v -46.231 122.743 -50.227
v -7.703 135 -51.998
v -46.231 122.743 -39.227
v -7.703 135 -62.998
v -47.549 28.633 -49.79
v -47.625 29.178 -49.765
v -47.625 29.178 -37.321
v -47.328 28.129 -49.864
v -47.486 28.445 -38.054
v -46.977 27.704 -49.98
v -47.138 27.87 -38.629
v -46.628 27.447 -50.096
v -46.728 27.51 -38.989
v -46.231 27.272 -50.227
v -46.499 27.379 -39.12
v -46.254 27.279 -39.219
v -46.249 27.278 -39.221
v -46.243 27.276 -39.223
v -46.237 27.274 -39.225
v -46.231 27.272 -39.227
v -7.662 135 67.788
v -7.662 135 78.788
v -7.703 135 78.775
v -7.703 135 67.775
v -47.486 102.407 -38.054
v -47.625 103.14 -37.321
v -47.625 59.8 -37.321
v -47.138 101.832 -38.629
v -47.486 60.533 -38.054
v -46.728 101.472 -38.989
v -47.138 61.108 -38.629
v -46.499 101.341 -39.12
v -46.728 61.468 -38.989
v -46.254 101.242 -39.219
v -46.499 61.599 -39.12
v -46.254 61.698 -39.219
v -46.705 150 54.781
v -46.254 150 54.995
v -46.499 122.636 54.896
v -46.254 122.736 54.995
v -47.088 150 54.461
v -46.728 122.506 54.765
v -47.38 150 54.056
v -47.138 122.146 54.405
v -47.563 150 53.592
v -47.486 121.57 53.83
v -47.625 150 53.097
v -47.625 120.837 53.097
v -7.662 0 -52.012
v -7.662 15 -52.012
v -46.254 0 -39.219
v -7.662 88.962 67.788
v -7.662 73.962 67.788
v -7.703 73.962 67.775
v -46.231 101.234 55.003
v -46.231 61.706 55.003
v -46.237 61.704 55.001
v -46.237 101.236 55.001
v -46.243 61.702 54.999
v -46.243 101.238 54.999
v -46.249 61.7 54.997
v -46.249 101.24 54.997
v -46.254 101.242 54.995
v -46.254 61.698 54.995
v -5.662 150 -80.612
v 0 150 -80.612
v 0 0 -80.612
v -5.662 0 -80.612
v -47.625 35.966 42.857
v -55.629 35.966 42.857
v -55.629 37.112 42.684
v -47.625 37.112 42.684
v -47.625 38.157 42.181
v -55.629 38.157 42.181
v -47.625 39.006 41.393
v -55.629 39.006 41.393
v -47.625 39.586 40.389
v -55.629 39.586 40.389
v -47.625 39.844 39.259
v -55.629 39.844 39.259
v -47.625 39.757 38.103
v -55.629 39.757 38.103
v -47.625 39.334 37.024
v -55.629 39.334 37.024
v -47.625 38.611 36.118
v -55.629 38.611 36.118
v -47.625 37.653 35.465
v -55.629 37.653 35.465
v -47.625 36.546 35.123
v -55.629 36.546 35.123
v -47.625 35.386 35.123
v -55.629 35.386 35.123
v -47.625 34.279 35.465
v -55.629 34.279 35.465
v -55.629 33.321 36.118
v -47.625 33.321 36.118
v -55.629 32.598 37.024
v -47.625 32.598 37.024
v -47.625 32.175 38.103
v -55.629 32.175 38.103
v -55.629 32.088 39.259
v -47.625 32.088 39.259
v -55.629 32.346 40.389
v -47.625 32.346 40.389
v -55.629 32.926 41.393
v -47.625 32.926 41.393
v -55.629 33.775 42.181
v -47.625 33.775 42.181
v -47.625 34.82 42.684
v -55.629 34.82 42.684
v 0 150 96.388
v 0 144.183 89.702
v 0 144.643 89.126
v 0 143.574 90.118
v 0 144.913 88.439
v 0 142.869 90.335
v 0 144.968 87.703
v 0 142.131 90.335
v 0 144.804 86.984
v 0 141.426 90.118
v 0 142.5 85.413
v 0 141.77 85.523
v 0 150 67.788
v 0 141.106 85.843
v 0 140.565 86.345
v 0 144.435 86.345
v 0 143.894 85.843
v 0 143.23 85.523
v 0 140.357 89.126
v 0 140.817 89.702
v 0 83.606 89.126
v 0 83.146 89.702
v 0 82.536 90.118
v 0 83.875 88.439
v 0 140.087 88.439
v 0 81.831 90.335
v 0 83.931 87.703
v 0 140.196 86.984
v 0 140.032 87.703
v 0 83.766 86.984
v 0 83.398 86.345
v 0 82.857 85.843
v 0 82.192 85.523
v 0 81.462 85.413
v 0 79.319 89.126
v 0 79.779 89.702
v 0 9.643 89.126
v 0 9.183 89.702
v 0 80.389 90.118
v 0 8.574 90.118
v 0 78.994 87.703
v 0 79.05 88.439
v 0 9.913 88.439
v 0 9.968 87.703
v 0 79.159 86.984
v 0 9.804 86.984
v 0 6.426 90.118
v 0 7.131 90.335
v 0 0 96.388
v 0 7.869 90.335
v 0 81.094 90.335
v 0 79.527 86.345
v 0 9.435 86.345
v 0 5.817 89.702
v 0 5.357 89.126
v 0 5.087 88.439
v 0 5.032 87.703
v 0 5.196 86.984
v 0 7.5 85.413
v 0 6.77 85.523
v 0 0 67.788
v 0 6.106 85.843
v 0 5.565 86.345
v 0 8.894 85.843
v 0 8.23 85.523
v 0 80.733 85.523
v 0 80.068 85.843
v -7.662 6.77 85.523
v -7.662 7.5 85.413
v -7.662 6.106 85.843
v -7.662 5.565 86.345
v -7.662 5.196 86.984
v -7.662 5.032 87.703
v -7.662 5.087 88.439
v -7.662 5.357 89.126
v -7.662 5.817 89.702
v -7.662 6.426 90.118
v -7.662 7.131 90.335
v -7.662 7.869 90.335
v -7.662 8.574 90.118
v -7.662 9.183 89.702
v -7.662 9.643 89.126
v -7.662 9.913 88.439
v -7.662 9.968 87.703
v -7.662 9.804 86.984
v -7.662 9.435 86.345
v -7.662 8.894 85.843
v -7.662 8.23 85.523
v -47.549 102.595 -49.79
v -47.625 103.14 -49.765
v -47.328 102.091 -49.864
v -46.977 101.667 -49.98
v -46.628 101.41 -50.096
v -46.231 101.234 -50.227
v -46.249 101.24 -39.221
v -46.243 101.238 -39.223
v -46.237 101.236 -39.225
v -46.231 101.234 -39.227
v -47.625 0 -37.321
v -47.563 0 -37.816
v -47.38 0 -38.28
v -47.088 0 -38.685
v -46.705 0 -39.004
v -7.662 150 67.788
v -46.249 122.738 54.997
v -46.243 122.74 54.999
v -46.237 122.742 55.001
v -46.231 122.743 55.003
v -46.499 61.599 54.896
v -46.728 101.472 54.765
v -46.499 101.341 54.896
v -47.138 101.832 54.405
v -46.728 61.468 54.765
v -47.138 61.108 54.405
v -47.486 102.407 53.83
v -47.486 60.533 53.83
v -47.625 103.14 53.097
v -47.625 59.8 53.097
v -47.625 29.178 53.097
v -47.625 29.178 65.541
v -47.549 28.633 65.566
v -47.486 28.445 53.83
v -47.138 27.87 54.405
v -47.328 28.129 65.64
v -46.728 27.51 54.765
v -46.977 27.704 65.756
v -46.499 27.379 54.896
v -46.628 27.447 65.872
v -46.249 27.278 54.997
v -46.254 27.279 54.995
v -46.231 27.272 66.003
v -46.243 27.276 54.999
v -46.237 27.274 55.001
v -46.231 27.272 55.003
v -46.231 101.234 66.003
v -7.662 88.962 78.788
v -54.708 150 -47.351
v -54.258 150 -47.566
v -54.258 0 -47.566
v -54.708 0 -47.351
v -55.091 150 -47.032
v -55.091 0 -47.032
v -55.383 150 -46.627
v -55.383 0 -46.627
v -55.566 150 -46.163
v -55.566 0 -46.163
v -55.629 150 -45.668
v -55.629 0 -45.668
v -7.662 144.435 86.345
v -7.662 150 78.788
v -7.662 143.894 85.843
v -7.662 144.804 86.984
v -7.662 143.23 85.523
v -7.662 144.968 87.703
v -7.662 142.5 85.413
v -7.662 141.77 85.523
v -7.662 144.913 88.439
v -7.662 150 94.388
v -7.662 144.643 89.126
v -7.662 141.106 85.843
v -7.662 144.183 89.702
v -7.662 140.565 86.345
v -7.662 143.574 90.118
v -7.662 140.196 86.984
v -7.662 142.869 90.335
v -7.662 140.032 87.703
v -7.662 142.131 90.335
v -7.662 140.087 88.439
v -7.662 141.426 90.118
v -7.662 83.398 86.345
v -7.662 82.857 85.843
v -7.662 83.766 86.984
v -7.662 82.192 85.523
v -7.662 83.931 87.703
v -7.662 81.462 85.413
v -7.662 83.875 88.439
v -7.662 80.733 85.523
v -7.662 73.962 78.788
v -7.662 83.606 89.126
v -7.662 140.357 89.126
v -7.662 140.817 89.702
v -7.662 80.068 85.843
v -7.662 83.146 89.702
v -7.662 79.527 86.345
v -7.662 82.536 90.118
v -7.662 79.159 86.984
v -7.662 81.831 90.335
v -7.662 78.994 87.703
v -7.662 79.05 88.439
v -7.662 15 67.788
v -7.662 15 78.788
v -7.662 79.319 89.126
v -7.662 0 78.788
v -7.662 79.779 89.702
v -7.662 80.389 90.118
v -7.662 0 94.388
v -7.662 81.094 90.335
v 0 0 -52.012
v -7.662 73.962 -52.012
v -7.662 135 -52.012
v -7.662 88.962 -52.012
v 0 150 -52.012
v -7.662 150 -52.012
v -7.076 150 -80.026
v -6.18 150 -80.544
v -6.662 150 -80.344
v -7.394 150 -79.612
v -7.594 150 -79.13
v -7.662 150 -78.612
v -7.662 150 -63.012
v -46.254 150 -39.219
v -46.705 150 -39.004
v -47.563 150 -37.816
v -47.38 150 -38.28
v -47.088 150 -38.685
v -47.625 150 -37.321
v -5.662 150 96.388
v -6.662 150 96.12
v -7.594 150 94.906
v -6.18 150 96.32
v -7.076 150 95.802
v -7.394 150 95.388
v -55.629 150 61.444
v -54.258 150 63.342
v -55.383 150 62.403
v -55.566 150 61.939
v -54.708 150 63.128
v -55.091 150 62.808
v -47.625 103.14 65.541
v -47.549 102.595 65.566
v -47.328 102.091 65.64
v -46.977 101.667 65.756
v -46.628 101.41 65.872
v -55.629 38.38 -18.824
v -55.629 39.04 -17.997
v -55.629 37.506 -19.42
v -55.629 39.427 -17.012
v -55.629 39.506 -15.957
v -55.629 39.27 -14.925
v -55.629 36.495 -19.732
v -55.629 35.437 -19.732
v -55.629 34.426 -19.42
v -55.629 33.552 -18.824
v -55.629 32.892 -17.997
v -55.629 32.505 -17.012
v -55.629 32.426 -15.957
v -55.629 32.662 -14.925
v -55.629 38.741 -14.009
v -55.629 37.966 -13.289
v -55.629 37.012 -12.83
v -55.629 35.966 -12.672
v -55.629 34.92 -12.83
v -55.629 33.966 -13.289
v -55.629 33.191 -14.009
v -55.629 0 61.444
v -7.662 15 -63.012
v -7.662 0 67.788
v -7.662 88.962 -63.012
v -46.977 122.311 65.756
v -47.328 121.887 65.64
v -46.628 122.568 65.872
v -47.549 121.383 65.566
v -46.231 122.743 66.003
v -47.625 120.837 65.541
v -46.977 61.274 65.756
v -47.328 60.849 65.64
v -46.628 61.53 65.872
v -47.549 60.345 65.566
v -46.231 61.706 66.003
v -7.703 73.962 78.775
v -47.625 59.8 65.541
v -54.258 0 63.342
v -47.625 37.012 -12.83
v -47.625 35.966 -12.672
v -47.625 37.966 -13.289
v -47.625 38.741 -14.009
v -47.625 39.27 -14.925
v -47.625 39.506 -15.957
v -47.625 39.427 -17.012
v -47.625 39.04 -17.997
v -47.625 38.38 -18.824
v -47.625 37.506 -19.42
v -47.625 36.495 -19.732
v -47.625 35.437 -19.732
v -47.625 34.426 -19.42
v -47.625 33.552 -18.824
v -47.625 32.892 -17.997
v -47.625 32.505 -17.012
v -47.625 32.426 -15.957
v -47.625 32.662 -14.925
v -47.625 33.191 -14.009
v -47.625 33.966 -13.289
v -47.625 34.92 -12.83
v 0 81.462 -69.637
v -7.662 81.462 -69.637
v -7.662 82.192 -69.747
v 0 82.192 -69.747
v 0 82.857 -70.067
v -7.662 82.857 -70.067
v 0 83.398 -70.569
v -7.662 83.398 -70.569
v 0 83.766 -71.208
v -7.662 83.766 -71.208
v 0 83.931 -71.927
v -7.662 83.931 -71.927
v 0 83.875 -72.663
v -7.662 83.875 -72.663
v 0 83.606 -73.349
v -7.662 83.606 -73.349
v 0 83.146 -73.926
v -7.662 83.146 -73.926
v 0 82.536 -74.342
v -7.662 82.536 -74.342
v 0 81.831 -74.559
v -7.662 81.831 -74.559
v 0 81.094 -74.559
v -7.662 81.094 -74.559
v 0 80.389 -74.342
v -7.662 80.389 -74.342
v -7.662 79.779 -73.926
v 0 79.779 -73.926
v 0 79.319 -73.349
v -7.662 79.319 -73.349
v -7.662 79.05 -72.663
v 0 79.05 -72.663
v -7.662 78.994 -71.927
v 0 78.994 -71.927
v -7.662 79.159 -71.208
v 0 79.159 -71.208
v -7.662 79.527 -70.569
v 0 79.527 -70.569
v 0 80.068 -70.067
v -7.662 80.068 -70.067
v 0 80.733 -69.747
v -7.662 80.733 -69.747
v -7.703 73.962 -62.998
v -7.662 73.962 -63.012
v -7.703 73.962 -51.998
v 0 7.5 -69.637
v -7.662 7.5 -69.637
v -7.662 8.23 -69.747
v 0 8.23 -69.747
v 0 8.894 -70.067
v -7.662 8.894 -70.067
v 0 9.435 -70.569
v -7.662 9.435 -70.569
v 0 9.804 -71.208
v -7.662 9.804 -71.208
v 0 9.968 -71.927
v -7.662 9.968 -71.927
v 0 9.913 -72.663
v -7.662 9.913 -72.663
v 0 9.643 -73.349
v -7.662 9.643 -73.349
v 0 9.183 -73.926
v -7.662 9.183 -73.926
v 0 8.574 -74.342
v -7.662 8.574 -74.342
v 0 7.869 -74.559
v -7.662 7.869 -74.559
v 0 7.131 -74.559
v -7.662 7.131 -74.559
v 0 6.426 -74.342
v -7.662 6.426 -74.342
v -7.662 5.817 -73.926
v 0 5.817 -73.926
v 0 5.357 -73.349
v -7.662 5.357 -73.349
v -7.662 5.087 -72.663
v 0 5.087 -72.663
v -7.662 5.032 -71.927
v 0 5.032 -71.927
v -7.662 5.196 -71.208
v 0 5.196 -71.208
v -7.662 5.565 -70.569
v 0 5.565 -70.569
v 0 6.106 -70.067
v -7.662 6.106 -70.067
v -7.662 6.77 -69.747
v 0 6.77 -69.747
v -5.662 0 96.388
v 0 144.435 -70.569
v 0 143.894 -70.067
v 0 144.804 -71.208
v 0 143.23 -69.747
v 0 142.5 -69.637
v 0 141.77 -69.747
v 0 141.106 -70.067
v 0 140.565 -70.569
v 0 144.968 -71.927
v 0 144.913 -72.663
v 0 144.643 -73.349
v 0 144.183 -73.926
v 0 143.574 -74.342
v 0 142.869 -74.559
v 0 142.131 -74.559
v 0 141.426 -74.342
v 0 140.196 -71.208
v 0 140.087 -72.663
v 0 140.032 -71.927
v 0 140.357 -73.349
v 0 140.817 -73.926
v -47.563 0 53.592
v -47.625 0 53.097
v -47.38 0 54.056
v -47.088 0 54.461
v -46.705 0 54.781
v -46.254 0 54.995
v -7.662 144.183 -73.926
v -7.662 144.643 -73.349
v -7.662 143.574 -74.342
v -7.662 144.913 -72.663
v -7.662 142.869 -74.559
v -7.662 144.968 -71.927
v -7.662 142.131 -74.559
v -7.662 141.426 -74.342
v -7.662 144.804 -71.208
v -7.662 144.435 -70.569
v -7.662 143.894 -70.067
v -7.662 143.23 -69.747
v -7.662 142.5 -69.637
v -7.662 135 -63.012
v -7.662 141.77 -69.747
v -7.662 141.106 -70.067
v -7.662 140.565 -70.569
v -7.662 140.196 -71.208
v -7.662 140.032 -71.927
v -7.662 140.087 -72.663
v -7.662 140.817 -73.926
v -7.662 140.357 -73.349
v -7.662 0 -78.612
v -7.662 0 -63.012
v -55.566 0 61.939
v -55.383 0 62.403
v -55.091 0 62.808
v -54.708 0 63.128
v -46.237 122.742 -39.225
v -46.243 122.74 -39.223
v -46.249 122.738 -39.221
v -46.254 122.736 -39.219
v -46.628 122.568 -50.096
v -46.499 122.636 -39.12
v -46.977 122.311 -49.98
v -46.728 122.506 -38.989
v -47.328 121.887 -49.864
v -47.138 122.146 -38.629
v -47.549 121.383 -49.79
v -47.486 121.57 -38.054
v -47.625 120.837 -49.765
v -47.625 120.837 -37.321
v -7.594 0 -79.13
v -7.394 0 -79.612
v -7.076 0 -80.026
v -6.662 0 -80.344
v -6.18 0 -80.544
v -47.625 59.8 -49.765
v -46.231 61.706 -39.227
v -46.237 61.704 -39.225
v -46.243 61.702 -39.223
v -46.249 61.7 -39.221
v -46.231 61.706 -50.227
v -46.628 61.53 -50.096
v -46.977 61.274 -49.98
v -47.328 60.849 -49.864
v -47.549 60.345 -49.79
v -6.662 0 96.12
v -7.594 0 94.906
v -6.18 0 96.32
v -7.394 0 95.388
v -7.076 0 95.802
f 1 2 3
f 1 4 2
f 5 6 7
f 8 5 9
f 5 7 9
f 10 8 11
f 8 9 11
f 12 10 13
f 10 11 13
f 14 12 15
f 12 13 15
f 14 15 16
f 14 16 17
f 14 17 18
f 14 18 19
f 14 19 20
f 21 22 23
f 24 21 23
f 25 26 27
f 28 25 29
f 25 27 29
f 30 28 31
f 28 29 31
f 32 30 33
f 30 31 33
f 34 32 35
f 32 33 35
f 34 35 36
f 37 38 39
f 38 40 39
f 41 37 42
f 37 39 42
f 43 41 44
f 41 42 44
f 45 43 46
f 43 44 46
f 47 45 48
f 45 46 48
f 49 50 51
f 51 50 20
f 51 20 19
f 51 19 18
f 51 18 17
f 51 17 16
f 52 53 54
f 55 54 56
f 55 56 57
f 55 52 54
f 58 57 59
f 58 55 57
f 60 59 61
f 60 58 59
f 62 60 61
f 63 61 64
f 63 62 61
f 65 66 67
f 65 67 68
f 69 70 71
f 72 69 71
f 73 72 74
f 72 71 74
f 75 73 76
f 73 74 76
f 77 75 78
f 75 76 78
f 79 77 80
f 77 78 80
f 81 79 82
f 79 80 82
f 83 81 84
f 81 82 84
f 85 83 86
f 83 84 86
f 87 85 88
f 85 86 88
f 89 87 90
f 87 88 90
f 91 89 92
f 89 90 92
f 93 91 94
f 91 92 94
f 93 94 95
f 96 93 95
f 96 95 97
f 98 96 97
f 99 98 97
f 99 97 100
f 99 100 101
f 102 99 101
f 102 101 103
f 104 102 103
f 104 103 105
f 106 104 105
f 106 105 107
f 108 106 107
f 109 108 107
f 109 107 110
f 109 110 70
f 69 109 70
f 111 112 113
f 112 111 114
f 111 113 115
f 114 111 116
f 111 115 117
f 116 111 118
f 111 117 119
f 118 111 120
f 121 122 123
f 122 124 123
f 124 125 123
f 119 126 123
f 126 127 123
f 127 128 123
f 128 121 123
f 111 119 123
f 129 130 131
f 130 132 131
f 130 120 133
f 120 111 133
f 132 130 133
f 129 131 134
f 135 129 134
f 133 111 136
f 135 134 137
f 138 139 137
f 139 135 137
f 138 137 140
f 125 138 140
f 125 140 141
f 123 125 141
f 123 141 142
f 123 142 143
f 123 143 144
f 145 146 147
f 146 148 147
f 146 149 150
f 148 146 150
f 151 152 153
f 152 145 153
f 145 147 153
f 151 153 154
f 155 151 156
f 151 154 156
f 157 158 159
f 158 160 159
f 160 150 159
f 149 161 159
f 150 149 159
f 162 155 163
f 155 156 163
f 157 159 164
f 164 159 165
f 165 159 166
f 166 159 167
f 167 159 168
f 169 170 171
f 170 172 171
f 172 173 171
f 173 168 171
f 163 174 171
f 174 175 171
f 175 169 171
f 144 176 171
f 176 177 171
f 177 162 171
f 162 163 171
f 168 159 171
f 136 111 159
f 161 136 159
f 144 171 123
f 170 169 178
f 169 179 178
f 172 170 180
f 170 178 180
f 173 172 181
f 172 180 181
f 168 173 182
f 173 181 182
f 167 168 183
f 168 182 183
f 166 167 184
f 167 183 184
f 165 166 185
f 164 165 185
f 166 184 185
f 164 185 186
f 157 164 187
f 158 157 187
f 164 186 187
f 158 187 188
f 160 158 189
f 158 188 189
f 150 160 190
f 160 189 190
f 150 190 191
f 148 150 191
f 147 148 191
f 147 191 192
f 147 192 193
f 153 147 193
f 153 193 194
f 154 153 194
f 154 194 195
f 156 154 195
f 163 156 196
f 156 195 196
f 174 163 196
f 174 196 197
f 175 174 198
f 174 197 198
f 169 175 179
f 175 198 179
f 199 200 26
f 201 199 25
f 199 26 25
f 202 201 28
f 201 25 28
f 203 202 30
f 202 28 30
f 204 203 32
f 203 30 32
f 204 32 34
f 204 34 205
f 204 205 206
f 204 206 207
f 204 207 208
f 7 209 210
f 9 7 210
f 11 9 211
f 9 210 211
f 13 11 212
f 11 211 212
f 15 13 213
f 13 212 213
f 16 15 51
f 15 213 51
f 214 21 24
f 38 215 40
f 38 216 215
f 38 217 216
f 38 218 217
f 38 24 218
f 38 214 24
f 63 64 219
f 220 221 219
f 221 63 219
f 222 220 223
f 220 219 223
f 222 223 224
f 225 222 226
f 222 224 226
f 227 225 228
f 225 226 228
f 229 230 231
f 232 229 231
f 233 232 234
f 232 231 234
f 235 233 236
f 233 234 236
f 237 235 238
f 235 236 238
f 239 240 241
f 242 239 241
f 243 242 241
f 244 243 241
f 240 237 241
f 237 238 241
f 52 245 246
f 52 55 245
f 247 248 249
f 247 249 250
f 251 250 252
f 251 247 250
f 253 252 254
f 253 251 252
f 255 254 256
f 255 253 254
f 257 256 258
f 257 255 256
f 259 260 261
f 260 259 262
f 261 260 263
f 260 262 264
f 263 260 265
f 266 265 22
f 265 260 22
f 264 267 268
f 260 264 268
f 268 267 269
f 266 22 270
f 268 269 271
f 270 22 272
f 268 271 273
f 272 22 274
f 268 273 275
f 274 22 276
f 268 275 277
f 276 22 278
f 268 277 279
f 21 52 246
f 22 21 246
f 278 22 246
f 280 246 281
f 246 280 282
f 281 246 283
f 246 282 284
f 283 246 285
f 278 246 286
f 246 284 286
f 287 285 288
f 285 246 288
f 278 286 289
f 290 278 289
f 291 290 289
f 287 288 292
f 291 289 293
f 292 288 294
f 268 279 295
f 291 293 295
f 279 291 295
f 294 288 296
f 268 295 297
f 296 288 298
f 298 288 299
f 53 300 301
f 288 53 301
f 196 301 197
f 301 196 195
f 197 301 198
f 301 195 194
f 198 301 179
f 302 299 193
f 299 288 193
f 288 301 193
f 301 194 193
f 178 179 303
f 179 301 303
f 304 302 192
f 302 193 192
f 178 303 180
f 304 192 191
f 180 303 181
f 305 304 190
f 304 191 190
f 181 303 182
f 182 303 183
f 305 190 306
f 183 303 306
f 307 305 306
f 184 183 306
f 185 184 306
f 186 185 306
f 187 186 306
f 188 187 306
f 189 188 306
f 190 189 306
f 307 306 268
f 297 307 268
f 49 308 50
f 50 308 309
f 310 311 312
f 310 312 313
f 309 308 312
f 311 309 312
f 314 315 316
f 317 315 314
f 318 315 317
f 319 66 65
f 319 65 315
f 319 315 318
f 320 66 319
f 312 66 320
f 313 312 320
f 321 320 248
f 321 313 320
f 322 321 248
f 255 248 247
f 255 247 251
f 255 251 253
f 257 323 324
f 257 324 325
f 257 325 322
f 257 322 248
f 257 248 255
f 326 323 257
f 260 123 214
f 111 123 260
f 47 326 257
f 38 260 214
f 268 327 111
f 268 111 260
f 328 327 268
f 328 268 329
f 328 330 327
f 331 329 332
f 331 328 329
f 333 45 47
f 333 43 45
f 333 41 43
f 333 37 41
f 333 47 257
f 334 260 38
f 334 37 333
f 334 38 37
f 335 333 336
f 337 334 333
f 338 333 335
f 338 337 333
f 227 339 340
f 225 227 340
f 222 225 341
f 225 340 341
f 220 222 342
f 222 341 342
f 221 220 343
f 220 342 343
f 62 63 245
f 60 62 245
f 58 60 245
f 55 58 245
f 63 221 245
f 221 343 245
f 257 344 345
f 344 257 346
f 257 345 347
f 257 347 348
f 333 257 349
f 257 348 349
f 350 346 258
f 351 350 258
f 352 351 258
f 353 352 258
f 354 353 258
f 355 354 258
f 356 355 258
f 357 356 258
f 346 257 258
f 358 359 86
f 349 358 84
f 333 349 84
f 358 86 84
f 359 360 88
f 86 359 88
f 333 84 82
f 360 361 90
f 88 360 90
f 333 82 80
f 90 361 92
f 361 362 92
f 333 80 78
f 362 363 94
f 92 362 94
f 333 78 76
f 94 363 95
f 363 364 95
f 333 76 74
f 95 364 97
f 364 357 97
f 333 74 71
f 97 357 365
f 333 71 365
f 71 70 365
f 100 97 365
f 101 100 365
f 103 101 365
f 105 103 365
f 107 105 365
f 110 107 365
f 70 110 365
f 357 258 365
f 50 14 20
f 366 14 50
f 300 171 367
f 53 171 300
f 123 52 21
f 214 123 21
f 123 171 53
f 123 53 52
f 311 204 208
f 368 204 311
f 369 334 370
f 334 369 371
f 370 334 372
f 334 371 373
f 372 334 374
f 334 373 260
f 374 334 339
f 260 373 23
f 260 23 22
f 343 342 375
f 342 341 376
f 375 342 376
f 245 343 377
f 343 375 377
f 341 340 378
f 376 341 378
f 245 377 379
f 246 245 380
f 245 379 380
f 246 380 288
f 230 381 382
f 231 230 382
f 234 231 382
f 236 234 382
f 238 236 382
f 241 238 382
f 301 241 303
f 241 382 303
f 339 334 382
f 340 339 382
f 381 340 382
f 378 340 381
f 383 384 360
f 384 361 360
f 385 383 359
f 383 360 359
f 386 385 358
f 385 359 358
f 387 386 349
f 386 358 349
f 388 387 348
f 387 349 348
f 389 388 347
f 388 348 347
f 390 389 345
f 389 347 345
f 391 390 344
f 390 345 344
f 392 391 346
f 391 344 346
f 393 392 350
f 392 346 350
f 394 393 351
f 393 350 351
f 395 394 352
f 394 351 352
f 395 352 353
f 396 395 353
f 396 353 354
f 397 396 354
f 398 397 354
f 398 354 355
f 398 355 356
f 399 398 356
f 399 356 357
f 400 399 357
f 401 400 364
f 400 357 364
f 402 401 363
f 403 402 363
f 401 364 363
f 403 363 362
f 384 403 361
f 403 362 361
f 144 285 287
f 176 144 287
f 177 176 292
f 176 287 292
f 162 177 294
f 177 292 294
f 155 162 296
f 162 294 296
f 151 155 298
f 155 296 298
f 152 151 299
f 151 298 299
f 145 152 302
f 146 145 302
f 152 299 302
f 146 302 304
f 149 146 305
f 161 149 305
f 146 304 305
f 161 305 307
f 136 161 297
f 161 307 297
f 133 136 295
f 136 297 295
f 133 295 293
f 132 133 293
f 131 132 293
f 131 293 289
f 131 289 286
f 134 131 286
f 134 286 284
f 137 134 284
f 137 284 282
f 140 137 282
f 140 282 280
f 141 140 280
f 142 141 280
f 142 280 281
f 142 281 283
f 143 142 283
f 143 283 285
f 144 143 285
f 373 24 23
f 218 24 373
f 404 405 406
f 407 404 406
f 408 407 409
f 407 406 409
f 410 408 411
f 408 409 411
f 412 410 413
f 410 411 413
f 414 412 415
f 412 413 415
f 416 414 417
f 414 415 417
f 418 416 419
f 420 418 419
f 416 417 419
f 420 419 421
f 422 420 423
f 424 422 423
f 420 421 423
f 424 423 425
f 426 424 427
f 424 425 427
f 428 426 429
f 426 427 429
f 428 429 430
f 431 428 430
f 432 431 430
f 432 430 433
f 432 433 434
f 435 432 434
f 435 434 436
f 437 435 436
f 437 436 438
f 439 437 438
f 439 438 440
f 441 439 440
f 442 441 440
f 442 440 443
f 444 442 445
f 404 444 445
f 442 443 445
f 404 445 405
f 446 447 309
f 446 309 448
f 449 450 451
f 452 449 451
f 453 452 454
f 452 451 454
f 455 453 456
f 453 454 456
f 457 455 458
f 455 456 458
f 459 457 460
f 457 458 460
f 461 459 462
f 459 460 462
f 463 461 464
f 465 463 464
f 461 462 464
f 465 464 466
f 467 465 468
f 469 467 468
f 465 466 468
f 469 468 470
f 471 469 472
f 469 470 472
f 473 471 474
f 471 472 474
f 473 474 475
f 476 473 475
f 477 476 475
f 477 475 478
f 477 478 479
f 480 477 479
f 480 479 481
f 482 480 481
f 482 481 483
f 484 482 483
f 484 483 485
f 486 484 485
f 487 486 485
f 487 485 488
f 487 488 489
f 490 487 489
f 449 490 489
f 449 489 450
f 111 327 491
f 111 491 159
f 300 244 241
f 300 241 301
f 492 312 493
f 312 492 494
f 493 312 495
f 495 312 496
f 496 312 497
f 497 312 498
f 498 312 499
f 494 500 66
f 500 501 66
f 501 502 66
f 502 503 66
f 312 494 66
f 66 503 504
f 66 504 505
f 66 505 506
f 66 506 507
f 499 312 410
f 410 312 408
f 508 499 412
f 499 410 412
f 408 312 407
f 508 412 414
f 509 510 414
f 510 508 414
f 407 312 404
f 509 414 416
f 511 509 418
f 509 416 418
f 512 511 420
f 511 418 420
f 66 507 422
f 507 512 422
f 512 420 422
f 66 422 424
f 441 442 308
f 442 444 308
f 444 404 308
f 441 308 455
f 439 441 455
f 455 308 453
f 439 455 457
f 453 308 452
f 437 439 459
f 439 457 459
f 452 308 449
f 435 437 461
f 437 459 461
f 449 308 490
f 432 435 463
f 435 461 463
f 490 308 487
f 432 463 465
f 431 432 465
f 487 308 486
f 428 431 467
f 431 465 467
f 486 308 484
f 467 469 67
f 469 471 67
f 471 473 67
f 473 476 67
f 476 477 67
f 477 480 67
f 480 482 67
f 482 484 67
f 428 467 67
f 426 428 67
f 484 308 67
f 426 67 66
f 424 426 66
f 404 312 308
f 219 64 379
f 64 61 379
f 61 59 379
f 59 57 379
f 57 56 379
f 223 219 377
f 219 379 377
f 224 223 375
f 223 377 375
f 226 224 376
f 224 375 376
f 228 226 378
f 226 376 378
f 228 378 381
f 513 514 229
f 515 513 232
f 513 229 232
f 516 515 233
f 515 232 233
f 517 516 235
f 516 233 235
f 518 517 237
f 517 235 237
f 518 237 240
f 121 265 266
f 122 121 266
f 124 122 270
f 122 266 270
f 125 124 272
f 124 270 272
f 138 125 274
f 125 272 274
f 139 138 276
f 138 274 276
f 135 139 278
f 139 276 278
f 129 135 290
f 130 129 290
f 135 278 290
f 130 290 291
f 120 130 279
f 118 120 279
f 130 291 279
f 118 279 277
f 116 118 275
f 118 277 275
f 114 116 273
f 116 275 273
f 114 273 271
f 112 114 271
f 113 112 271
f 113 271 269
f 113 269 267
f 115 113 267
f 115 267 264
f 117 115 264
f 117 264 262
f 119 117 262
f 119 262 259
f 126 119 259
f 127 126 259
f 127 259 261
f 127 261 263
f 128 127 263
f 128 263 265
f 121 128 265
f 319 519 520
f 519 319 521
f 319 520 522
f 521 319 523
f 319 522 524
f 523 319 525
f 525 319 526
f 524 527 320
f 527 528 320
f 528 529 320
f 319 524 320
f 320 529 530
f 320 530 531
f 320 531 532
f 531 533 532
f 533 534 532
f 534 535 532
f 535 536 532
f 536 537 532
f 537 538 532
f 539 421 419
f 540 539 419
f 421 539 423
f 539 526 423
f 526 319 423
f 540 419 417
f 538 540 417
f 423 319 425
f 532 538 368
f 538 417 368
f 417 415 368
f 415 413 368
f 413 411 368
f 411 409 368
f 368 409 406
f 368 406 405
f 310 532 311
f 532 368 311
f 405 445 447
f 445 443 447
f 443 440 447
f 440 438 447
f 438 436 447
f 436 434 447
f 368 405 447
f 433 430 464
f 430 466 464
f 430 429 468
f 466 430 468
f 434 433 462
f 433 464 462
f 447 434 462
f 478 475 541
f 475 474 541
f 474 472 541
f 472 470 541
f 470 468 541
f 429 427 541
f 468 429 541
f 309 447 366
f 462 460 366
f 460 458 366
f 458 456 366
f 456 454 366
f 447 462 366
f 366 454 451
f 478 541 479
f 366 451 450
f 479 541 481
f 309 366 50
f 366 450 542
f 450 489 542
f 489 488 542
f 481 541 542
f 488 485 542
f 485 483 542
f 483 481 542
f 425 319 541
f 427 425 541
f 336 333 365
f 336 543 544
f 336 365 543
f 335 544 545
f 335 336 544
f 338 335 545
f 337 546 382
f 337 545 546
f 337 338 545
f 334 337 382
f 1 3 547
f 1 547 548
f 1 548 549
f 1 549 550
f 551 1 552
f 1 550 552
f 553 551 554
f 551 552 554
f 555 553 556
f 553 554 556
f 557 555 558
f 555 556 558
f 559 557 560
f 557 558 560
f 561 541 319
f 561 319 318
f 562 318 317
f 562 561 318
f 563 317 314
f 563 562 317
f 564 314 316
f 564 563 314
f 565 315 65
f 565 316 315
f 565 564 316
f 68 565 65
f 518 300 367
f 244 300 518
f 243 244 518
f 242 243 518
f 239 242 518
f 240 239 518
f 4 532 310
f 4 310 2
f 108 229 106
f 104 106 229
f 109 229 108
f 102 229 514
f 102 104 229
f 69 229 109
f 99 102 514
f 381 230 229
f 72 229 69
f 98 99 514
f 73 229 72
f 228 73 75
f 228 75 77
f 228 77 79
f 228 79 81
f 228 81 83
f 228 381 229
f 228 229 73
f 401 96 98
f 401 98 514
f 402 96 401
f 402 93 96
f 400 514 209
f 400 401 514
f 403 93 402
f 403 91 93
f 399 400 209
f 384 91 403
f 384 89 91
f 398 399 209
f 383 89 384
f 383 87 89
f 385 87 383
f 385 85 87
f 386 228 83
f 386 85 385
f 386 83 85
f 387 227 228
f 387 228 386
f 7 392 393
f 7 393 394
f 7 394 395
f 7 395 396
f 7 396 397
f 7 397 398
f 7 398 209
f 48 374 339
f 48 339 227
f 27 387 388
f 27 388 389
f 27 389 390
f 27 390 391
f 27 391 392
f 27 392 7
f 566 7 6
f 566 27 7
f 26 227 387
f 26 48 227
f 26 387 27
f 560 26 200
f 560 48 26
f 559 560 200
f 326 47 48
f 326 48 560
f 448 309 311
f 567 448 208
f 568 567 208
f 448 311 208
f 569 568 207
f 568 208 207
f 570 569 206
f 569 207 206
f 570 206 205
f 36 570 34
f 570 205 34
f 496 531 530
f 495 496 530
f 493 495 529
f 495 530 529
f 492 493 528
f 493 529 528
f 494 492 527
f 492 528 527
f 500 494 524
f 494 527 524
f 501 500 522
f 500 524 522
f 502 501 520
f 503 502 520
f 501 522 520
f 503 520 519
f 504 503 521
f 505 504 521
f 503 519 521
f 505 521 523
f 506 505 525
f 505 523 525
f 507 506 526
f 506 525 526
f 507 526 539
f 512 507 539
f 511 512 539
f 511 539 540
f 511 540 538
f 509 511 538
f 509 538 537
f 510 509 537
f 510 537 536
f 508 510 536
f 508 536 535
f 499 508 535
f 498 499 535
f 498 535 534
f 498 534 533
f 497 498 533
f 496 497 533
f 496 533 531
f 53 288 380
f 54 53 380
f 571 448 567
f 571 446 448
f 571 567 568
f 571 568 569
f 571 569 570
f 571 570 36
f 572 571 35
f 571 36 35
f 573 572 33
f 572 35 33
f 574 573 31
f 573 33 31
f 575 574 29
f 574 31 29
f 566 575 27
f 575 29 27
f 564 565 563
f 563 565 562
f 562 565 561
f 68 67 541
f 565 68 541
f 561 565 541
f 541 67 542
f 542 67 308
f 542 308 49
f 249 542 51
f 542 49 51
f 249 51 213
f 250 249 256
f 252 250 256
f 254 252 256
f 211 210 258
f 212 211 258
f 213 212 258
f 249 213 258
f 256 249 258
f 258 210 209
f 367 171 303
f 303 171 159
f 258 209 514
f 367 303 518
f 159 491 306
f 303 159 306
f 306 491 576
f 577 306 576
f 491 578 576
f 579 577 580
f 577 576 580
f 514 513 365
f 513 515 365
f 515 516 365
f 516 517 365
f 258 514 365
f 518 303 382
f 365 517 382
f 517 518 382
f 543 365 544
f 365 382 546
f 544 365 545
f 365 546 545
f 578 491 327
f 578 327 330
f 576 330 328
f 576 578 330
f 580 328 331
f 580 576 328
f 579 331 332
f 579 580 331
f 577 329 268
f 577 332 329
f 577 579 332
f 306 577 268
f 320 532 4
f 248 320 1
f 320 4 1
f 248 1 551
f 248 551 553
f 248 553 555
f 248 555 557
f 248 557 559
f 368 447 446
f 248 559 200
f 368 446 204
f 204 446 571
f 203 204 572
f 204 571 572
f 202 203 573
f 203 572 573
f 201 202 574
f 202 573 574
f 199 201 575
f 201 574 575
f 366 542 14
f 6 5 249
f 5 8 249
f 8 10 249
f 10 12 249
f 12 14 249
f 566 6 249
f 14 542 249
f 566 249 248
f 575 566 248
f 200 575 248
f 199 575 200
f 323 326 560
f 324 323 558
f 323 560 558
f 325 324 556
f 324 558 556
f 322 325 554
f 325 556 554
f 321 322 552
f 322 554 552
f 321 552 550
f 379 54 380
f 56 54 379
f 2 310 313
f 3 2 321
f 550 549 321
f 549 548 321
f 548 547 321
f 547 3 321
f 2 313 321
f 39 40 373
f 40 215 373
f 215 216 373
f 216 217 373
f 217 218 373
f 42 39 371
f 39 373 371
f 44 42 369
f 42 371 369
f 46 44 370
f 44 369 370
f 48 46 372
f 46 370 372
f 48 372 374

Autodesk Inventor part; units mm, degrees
ref_plane "YZ Plane" through (0, 0, 0) normal (1, 0, 0) x (0, 1, 0)
ref_plane "XZ Plane" through (0, 0, 0) normal (0, 1, 0) x (-1, 0, 0)
ref_plane "XY Plane" through (0, 0, 0) normal (0, 0, 1) x (1, 0, 0)
sketch "Sketch1" plane through (0, 0, 0) normal (0, 1, 0) x (-1, 0, 0)
  line L0 (0, 96.3881) -> (0, -80.6119)
  line L1 (0, -80.6119) -> (7.6619, -80.6119)
  line L2 (7.6619, -80.6119) -> (7.6619, -63.0119)
  line L3 (7.6619, -63.0119) -> (55.6286, -47.1119)
  line L4 (55.6286, -47.1119) -> (55.6286, 62.8881)
  line L5 (55.6286, 62.8881) -> (7.6619, 78.7881)
  line L6 (7.6619, 78.7881) -> (7.6619, 96.3881)
  line L7 (7.6619, 96.3881) -> (0, 96.3881)
  point P0 (0, 0)
  dimension "d0" = 177
  dimension "d1" = 17.6
  dimension "d2" = 17.6
  dimension "d3" = 110
  dimension "d4" = 15.9
extrude "Extrusion1" add sketch "Sketch1" along normal blind 150
sketch "Sketch2" plane through (0, 150, 0) normal (0, 1, 0) x (1, 0, 0)
  line L0 (-7.6619, -78.7881) -> (-7.6619, -96.3881) projected
  line L1 (-7.6619, -78.7881) -> (0, -78.7881)
  line L2 (0, -96.3881) -> (0, 80.6119) projected
  line L3 (0, -78.7881) -> (0, -67.7881)
  line L4 (0, -67.7881) -> (-7.6619, -67.7881)
  line L5 (-7.6619, 80.6119) -> (-7.6619, 63.0119) projected
  line L6 (-7.6619, 63.0119) -> (0, 63.0119)
  line L7 (0, 63.0119) -> (0, 52.0119)
  line L8 (0, 52.0119) -> (-7.6619, 52.0119)
  line L9 (0, -67.7881) -> (0, 52.0119)
  line L10 (-7.6619, -67.7881) -> (-47.625, -54.5411)
  line L11 (-7.6619, 52.0119) -> (-47.625, 38.7649)
  line L12 (-55.6286, -62.8881) -> (-7.6619, -78.7881) projected
  line L13 (-7.6619, 63.0119) -> (-55.6286, 47.1119) projected
  line L14 (-47.625, -54.5411) -> (-47.625, 38.7649)
  point P0 (0, 0)
  dimension "d8" = 11
  dimension "d9" = 11
  dimension "d10" = 0
  dimension "d11" = 0
  dimension "d12" = 93.306
extrude "Extrusion2" cut sketch "Sketch2" against normal blind 150
sketch "Sketch3" plane through (0, 0, -80.6119) normal (0, 0, -1) x (-1, 0, 0)
  line L0 (0, 0) -> (0, 150) projected
  line L1 (0, 135) -> (7.7027, 135)
  line L2 (7.7027, 135) -> (47.625, 122.3)
  line L3 (47.625, 150) -> (47.625, 0) projected
  line L4 (47.625, 122.3) -> (47.625, 101.6779)
  line L5 (47.625, 101.6779) -> (7.6619, 88.9625)
  line L6 (7.6619, 150) -> (7.6619, 0) projected
  line L7 (7.6619, 88.9625) -> (0, 88.9625)
  line L8 (0, 135) -> (0, 88.9625)
  line L9 (0, 73.9625) -> (7.7027, 73.9625)
  line L10 (7.7027, 73.9625) -> (47.625, 61.2625)
  line L11 (47.625, 61.2625) -> (47.625, 27.7154)
  line L12 (47.625, 27.7154) -> (7.6619, 15)
  line L13 (7.6619, 15) -> (0, 15)
  line L14 (0, 73.9625) -> (0, 15)
  line L15 (0, 150) -> (7.6619, 150) projected
  line L16 (0, 0) -> (7.6619, 0) projected
  point P0 (7.6619, 15)
  point P1 (7.6619, 73.9625)
  point P2 (7.6619, 135)
  dimension "d15" = 72.35
  dimension "d16" = 72.353
  dimension "d18" = 15
  dimension "d19" = 15
  dimension "d20" = 46.0375
  dimension "d22" = 72.353
  dimension "d23" = 72.35
  dimension "d24" = 15
extrude "Extrusion3" cut sketch "Sketch3" against normal blind 1500 contours L6 L9 L10 L3 L12 | L6 L1 L2 L3 L5
fillet "Fillet1" radius 2 8 edges at (-47.625, 122.3, -44.2649) (-47.625, 101.6779, -44.2649) (-47.625, 61.2625, -44.2649) (-47.625, 27.7154, -44.2649) (-47.625, 61.2625, 60.0411) (-47.625, 122.3, 60.0411) (-47.625, 101.6779, 60.0411) (-47.625, 27.7154, 60.0411)
fillet "Fillet2" radius 2 12 edges at (-47.625, 121.5687, 54.5411) (-47.625, 136.15, 54.5411) (-47.625, 60.5312, 54.5411) (-47.625, 102.4092, 54.5411) (-47.625, 28.4467, 54.5411) (-47.625, 13.8577, 54.5411) (-47.625, 136.15, -38.7649) (-47.625, 121.5687, -38.7649) (-47.625, 60.5312, -38.7649) (-47.625, 102.4092, -38.7649) (-47.625, 13.8577, -38.7649) (-47.625, 28.4467, -38.7649)
fillet "Fillet3" radius 2 4 edges at (-7.6619, 75, 96.3881) (-7.6619, 75, -80.6119) (-55.6286, 75, -47.1119) (-55.6286, 75, 62.8881)
sketch "Sketch4" plane through (-7.6619, 15, -52.0119) normal (-1, 0, 0) x (0, 0, 1)
  line L0 (130.8, 135) -> (146.4, 135) projected
  line L1 (139.9, 135) -> (139.9, -14.5366)
  line L2 (-20.1, 135) -> (-20.1, -15)
  line L3 (-26.6, -15) -> (-26.6, 135) projected
  line L4 (-26.6, -15) -> (-11, -15) projected
  line L5 (148.4, -15) -> (148.4, 135) projected
  circle A0 centre (-20.1, 127.5) radius 2.475
  line L6 (-26.6, 135) -> (-11, 135) projected
  circle A1 centre (-20.1, 66.4625) radius 2.475
  circle A2 centre (-20.1, -7.5) radius 2.475
  line L7 (-10.9865, 58.9625) -> (0.0135, 58.9625) projected
  point P0 (52.0119, -15)
  dimension "d30" = 160
  dimension "d31" = 150
  dimension "d32" = 0
  dimension "d33" = 8.5
  dimension "d34" = 4.95
  dimension "d35" = 7.5
  dimension "d36" = 7.5
  dimension "d37" = 7.5
extrude "Extrusion4" cut sketch "Sketch4" against normal blind 1500 contours A0 L2 | L2 A0 | A1 L2 | L2 A1 | A2 L2 | L2 A2
ref_plane "Work Plane1" through (-221.551, 135, 7.8881) normal (0, 0, -1) x (0, -1, 0)
mirror "Mirror1" about plane through (-221.551, 135, 7.8881) normal (0, 0, -1) of "Extrusion4"
sketch "Sketch5" plane through (-55.6286, 0, -45.6678) normal (-1, 0, 0) x (0, 0, 1)
  line L0 (99.426, 7.686) -> (7.686, 7.686)
  line L1 (7.686, 7.686) -> (7.686, 65.906)
  line L2 (7.686, 65.906) -> (99.426, 65.906)
  line L3 (99.426, 65.906) -> (99.426, 7.686)
  line L4 (0, 0) -> (0, 150) projected
  line L5 (0, 0) -> (107.1119, 0) projected
  circle A0 centre (29.446, 35.966) radius 3.5498
  circle A1 centre (84.636, 35.966) radius 3.8886
  point P0 (45.6678, 0)
  dimension "d40" = 58.22
  dimension "d41" = 91.74
  dimension "d42" = 7.686
  dimension "d43" = 7.686
  dimension "d44" = 21.76
  dimension "d45" = 29.94
  dimension "d46" = 55.19
  dimension "d47" = 29.94
extrude "Extrusion5" cut sketch "Sketch5" against normal blind 21.76 contours A0 | A1
equation "\"d48\" = d44"
properties part number "PiSpotAttachment"
